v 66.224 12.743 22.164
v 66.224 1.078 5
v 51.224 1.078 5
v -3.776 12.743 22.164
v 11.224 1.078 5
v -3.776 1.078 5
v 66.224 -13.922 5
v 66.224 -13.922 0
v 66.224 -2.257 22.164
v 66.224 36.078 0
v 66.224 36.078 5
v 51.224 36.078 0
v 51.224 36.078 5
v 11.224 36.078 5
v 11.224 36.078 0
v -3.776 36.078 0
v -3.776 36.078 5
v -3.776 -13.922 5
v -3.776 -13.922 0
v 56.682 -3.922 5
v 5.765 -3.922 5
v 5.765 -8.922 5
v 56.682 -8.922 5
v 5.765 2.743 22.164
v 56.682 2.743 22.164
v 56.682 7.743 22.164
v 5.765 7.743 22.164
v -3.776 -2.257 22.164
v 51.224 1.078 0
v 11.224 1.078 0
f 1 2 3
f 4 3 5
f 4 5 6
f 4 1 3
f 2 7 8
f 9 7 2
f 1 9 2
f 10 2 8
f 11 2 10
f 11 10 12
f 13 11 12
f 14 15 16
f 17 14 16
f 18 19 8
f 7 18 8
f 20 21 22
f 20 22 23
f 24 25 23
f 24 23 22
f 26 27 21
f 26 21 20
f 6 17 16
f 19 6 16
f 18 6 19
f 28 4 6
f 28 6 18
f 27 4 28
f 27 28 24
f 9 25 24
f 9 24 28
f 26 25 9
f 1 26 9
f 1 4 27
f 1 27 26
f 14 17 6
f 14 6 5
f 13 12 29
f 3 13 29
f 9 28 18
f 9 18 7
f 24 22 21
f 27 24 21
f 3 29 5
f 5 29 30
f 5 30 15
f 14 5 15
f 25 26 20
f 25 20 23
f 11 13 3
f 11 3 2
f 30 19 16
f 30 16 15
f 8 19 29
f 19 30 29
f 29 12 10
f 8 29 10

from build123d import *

# Parameters (mm, degrees)
F1_DEPTH = 5
F3_W     = 70
F3_H     = 15
F3_W_2   = 50.9169398992
F3_H_2   = 5


with BuildPart() as f1:
    # F0 (on Top) → F1 (new body)
    with BuildSketch(Plane.XY):
        Polygon((-3.7761517194, 36.0778824546), (-3.7761517194, -13.9221175454), (66.2238482806, -13.9221175454), (66.2238482806, 36.0778824546), (51.2238482806, 36.0778824546), (51.2238482806, 1.0778824546), (11.2238482806, 1.0778824546), (11.2238482806, 36.0778824546), align=None)
    extrude(amount=F1_DEPTH)

    # F4: sweep along a path in F2
    with BuildLine(Plane(origin=(-3.7761517194, 0, 0), x_dir=(0, -1, 0), z_dir=(-1, 0, 0))) as f4_path:
        Line((13.9221175454, 5), (2.2568308138, 22.1641566604))
    # F3 (on face) → F4 (sweep)
    with BuildSketch(Plane.XY.offset(5)):
        with Locations((31.2238482806, -6.4221175454)):
            Rectangle(F3_W, F3_H)
        with Locations((31.2238482806, -6.4221175454)):
            Rectangle(F3_W_2, F3_H_2, mode=Mode.SUBTRACT)
    sweep(path=f4_path.line)


solid = f1.part
